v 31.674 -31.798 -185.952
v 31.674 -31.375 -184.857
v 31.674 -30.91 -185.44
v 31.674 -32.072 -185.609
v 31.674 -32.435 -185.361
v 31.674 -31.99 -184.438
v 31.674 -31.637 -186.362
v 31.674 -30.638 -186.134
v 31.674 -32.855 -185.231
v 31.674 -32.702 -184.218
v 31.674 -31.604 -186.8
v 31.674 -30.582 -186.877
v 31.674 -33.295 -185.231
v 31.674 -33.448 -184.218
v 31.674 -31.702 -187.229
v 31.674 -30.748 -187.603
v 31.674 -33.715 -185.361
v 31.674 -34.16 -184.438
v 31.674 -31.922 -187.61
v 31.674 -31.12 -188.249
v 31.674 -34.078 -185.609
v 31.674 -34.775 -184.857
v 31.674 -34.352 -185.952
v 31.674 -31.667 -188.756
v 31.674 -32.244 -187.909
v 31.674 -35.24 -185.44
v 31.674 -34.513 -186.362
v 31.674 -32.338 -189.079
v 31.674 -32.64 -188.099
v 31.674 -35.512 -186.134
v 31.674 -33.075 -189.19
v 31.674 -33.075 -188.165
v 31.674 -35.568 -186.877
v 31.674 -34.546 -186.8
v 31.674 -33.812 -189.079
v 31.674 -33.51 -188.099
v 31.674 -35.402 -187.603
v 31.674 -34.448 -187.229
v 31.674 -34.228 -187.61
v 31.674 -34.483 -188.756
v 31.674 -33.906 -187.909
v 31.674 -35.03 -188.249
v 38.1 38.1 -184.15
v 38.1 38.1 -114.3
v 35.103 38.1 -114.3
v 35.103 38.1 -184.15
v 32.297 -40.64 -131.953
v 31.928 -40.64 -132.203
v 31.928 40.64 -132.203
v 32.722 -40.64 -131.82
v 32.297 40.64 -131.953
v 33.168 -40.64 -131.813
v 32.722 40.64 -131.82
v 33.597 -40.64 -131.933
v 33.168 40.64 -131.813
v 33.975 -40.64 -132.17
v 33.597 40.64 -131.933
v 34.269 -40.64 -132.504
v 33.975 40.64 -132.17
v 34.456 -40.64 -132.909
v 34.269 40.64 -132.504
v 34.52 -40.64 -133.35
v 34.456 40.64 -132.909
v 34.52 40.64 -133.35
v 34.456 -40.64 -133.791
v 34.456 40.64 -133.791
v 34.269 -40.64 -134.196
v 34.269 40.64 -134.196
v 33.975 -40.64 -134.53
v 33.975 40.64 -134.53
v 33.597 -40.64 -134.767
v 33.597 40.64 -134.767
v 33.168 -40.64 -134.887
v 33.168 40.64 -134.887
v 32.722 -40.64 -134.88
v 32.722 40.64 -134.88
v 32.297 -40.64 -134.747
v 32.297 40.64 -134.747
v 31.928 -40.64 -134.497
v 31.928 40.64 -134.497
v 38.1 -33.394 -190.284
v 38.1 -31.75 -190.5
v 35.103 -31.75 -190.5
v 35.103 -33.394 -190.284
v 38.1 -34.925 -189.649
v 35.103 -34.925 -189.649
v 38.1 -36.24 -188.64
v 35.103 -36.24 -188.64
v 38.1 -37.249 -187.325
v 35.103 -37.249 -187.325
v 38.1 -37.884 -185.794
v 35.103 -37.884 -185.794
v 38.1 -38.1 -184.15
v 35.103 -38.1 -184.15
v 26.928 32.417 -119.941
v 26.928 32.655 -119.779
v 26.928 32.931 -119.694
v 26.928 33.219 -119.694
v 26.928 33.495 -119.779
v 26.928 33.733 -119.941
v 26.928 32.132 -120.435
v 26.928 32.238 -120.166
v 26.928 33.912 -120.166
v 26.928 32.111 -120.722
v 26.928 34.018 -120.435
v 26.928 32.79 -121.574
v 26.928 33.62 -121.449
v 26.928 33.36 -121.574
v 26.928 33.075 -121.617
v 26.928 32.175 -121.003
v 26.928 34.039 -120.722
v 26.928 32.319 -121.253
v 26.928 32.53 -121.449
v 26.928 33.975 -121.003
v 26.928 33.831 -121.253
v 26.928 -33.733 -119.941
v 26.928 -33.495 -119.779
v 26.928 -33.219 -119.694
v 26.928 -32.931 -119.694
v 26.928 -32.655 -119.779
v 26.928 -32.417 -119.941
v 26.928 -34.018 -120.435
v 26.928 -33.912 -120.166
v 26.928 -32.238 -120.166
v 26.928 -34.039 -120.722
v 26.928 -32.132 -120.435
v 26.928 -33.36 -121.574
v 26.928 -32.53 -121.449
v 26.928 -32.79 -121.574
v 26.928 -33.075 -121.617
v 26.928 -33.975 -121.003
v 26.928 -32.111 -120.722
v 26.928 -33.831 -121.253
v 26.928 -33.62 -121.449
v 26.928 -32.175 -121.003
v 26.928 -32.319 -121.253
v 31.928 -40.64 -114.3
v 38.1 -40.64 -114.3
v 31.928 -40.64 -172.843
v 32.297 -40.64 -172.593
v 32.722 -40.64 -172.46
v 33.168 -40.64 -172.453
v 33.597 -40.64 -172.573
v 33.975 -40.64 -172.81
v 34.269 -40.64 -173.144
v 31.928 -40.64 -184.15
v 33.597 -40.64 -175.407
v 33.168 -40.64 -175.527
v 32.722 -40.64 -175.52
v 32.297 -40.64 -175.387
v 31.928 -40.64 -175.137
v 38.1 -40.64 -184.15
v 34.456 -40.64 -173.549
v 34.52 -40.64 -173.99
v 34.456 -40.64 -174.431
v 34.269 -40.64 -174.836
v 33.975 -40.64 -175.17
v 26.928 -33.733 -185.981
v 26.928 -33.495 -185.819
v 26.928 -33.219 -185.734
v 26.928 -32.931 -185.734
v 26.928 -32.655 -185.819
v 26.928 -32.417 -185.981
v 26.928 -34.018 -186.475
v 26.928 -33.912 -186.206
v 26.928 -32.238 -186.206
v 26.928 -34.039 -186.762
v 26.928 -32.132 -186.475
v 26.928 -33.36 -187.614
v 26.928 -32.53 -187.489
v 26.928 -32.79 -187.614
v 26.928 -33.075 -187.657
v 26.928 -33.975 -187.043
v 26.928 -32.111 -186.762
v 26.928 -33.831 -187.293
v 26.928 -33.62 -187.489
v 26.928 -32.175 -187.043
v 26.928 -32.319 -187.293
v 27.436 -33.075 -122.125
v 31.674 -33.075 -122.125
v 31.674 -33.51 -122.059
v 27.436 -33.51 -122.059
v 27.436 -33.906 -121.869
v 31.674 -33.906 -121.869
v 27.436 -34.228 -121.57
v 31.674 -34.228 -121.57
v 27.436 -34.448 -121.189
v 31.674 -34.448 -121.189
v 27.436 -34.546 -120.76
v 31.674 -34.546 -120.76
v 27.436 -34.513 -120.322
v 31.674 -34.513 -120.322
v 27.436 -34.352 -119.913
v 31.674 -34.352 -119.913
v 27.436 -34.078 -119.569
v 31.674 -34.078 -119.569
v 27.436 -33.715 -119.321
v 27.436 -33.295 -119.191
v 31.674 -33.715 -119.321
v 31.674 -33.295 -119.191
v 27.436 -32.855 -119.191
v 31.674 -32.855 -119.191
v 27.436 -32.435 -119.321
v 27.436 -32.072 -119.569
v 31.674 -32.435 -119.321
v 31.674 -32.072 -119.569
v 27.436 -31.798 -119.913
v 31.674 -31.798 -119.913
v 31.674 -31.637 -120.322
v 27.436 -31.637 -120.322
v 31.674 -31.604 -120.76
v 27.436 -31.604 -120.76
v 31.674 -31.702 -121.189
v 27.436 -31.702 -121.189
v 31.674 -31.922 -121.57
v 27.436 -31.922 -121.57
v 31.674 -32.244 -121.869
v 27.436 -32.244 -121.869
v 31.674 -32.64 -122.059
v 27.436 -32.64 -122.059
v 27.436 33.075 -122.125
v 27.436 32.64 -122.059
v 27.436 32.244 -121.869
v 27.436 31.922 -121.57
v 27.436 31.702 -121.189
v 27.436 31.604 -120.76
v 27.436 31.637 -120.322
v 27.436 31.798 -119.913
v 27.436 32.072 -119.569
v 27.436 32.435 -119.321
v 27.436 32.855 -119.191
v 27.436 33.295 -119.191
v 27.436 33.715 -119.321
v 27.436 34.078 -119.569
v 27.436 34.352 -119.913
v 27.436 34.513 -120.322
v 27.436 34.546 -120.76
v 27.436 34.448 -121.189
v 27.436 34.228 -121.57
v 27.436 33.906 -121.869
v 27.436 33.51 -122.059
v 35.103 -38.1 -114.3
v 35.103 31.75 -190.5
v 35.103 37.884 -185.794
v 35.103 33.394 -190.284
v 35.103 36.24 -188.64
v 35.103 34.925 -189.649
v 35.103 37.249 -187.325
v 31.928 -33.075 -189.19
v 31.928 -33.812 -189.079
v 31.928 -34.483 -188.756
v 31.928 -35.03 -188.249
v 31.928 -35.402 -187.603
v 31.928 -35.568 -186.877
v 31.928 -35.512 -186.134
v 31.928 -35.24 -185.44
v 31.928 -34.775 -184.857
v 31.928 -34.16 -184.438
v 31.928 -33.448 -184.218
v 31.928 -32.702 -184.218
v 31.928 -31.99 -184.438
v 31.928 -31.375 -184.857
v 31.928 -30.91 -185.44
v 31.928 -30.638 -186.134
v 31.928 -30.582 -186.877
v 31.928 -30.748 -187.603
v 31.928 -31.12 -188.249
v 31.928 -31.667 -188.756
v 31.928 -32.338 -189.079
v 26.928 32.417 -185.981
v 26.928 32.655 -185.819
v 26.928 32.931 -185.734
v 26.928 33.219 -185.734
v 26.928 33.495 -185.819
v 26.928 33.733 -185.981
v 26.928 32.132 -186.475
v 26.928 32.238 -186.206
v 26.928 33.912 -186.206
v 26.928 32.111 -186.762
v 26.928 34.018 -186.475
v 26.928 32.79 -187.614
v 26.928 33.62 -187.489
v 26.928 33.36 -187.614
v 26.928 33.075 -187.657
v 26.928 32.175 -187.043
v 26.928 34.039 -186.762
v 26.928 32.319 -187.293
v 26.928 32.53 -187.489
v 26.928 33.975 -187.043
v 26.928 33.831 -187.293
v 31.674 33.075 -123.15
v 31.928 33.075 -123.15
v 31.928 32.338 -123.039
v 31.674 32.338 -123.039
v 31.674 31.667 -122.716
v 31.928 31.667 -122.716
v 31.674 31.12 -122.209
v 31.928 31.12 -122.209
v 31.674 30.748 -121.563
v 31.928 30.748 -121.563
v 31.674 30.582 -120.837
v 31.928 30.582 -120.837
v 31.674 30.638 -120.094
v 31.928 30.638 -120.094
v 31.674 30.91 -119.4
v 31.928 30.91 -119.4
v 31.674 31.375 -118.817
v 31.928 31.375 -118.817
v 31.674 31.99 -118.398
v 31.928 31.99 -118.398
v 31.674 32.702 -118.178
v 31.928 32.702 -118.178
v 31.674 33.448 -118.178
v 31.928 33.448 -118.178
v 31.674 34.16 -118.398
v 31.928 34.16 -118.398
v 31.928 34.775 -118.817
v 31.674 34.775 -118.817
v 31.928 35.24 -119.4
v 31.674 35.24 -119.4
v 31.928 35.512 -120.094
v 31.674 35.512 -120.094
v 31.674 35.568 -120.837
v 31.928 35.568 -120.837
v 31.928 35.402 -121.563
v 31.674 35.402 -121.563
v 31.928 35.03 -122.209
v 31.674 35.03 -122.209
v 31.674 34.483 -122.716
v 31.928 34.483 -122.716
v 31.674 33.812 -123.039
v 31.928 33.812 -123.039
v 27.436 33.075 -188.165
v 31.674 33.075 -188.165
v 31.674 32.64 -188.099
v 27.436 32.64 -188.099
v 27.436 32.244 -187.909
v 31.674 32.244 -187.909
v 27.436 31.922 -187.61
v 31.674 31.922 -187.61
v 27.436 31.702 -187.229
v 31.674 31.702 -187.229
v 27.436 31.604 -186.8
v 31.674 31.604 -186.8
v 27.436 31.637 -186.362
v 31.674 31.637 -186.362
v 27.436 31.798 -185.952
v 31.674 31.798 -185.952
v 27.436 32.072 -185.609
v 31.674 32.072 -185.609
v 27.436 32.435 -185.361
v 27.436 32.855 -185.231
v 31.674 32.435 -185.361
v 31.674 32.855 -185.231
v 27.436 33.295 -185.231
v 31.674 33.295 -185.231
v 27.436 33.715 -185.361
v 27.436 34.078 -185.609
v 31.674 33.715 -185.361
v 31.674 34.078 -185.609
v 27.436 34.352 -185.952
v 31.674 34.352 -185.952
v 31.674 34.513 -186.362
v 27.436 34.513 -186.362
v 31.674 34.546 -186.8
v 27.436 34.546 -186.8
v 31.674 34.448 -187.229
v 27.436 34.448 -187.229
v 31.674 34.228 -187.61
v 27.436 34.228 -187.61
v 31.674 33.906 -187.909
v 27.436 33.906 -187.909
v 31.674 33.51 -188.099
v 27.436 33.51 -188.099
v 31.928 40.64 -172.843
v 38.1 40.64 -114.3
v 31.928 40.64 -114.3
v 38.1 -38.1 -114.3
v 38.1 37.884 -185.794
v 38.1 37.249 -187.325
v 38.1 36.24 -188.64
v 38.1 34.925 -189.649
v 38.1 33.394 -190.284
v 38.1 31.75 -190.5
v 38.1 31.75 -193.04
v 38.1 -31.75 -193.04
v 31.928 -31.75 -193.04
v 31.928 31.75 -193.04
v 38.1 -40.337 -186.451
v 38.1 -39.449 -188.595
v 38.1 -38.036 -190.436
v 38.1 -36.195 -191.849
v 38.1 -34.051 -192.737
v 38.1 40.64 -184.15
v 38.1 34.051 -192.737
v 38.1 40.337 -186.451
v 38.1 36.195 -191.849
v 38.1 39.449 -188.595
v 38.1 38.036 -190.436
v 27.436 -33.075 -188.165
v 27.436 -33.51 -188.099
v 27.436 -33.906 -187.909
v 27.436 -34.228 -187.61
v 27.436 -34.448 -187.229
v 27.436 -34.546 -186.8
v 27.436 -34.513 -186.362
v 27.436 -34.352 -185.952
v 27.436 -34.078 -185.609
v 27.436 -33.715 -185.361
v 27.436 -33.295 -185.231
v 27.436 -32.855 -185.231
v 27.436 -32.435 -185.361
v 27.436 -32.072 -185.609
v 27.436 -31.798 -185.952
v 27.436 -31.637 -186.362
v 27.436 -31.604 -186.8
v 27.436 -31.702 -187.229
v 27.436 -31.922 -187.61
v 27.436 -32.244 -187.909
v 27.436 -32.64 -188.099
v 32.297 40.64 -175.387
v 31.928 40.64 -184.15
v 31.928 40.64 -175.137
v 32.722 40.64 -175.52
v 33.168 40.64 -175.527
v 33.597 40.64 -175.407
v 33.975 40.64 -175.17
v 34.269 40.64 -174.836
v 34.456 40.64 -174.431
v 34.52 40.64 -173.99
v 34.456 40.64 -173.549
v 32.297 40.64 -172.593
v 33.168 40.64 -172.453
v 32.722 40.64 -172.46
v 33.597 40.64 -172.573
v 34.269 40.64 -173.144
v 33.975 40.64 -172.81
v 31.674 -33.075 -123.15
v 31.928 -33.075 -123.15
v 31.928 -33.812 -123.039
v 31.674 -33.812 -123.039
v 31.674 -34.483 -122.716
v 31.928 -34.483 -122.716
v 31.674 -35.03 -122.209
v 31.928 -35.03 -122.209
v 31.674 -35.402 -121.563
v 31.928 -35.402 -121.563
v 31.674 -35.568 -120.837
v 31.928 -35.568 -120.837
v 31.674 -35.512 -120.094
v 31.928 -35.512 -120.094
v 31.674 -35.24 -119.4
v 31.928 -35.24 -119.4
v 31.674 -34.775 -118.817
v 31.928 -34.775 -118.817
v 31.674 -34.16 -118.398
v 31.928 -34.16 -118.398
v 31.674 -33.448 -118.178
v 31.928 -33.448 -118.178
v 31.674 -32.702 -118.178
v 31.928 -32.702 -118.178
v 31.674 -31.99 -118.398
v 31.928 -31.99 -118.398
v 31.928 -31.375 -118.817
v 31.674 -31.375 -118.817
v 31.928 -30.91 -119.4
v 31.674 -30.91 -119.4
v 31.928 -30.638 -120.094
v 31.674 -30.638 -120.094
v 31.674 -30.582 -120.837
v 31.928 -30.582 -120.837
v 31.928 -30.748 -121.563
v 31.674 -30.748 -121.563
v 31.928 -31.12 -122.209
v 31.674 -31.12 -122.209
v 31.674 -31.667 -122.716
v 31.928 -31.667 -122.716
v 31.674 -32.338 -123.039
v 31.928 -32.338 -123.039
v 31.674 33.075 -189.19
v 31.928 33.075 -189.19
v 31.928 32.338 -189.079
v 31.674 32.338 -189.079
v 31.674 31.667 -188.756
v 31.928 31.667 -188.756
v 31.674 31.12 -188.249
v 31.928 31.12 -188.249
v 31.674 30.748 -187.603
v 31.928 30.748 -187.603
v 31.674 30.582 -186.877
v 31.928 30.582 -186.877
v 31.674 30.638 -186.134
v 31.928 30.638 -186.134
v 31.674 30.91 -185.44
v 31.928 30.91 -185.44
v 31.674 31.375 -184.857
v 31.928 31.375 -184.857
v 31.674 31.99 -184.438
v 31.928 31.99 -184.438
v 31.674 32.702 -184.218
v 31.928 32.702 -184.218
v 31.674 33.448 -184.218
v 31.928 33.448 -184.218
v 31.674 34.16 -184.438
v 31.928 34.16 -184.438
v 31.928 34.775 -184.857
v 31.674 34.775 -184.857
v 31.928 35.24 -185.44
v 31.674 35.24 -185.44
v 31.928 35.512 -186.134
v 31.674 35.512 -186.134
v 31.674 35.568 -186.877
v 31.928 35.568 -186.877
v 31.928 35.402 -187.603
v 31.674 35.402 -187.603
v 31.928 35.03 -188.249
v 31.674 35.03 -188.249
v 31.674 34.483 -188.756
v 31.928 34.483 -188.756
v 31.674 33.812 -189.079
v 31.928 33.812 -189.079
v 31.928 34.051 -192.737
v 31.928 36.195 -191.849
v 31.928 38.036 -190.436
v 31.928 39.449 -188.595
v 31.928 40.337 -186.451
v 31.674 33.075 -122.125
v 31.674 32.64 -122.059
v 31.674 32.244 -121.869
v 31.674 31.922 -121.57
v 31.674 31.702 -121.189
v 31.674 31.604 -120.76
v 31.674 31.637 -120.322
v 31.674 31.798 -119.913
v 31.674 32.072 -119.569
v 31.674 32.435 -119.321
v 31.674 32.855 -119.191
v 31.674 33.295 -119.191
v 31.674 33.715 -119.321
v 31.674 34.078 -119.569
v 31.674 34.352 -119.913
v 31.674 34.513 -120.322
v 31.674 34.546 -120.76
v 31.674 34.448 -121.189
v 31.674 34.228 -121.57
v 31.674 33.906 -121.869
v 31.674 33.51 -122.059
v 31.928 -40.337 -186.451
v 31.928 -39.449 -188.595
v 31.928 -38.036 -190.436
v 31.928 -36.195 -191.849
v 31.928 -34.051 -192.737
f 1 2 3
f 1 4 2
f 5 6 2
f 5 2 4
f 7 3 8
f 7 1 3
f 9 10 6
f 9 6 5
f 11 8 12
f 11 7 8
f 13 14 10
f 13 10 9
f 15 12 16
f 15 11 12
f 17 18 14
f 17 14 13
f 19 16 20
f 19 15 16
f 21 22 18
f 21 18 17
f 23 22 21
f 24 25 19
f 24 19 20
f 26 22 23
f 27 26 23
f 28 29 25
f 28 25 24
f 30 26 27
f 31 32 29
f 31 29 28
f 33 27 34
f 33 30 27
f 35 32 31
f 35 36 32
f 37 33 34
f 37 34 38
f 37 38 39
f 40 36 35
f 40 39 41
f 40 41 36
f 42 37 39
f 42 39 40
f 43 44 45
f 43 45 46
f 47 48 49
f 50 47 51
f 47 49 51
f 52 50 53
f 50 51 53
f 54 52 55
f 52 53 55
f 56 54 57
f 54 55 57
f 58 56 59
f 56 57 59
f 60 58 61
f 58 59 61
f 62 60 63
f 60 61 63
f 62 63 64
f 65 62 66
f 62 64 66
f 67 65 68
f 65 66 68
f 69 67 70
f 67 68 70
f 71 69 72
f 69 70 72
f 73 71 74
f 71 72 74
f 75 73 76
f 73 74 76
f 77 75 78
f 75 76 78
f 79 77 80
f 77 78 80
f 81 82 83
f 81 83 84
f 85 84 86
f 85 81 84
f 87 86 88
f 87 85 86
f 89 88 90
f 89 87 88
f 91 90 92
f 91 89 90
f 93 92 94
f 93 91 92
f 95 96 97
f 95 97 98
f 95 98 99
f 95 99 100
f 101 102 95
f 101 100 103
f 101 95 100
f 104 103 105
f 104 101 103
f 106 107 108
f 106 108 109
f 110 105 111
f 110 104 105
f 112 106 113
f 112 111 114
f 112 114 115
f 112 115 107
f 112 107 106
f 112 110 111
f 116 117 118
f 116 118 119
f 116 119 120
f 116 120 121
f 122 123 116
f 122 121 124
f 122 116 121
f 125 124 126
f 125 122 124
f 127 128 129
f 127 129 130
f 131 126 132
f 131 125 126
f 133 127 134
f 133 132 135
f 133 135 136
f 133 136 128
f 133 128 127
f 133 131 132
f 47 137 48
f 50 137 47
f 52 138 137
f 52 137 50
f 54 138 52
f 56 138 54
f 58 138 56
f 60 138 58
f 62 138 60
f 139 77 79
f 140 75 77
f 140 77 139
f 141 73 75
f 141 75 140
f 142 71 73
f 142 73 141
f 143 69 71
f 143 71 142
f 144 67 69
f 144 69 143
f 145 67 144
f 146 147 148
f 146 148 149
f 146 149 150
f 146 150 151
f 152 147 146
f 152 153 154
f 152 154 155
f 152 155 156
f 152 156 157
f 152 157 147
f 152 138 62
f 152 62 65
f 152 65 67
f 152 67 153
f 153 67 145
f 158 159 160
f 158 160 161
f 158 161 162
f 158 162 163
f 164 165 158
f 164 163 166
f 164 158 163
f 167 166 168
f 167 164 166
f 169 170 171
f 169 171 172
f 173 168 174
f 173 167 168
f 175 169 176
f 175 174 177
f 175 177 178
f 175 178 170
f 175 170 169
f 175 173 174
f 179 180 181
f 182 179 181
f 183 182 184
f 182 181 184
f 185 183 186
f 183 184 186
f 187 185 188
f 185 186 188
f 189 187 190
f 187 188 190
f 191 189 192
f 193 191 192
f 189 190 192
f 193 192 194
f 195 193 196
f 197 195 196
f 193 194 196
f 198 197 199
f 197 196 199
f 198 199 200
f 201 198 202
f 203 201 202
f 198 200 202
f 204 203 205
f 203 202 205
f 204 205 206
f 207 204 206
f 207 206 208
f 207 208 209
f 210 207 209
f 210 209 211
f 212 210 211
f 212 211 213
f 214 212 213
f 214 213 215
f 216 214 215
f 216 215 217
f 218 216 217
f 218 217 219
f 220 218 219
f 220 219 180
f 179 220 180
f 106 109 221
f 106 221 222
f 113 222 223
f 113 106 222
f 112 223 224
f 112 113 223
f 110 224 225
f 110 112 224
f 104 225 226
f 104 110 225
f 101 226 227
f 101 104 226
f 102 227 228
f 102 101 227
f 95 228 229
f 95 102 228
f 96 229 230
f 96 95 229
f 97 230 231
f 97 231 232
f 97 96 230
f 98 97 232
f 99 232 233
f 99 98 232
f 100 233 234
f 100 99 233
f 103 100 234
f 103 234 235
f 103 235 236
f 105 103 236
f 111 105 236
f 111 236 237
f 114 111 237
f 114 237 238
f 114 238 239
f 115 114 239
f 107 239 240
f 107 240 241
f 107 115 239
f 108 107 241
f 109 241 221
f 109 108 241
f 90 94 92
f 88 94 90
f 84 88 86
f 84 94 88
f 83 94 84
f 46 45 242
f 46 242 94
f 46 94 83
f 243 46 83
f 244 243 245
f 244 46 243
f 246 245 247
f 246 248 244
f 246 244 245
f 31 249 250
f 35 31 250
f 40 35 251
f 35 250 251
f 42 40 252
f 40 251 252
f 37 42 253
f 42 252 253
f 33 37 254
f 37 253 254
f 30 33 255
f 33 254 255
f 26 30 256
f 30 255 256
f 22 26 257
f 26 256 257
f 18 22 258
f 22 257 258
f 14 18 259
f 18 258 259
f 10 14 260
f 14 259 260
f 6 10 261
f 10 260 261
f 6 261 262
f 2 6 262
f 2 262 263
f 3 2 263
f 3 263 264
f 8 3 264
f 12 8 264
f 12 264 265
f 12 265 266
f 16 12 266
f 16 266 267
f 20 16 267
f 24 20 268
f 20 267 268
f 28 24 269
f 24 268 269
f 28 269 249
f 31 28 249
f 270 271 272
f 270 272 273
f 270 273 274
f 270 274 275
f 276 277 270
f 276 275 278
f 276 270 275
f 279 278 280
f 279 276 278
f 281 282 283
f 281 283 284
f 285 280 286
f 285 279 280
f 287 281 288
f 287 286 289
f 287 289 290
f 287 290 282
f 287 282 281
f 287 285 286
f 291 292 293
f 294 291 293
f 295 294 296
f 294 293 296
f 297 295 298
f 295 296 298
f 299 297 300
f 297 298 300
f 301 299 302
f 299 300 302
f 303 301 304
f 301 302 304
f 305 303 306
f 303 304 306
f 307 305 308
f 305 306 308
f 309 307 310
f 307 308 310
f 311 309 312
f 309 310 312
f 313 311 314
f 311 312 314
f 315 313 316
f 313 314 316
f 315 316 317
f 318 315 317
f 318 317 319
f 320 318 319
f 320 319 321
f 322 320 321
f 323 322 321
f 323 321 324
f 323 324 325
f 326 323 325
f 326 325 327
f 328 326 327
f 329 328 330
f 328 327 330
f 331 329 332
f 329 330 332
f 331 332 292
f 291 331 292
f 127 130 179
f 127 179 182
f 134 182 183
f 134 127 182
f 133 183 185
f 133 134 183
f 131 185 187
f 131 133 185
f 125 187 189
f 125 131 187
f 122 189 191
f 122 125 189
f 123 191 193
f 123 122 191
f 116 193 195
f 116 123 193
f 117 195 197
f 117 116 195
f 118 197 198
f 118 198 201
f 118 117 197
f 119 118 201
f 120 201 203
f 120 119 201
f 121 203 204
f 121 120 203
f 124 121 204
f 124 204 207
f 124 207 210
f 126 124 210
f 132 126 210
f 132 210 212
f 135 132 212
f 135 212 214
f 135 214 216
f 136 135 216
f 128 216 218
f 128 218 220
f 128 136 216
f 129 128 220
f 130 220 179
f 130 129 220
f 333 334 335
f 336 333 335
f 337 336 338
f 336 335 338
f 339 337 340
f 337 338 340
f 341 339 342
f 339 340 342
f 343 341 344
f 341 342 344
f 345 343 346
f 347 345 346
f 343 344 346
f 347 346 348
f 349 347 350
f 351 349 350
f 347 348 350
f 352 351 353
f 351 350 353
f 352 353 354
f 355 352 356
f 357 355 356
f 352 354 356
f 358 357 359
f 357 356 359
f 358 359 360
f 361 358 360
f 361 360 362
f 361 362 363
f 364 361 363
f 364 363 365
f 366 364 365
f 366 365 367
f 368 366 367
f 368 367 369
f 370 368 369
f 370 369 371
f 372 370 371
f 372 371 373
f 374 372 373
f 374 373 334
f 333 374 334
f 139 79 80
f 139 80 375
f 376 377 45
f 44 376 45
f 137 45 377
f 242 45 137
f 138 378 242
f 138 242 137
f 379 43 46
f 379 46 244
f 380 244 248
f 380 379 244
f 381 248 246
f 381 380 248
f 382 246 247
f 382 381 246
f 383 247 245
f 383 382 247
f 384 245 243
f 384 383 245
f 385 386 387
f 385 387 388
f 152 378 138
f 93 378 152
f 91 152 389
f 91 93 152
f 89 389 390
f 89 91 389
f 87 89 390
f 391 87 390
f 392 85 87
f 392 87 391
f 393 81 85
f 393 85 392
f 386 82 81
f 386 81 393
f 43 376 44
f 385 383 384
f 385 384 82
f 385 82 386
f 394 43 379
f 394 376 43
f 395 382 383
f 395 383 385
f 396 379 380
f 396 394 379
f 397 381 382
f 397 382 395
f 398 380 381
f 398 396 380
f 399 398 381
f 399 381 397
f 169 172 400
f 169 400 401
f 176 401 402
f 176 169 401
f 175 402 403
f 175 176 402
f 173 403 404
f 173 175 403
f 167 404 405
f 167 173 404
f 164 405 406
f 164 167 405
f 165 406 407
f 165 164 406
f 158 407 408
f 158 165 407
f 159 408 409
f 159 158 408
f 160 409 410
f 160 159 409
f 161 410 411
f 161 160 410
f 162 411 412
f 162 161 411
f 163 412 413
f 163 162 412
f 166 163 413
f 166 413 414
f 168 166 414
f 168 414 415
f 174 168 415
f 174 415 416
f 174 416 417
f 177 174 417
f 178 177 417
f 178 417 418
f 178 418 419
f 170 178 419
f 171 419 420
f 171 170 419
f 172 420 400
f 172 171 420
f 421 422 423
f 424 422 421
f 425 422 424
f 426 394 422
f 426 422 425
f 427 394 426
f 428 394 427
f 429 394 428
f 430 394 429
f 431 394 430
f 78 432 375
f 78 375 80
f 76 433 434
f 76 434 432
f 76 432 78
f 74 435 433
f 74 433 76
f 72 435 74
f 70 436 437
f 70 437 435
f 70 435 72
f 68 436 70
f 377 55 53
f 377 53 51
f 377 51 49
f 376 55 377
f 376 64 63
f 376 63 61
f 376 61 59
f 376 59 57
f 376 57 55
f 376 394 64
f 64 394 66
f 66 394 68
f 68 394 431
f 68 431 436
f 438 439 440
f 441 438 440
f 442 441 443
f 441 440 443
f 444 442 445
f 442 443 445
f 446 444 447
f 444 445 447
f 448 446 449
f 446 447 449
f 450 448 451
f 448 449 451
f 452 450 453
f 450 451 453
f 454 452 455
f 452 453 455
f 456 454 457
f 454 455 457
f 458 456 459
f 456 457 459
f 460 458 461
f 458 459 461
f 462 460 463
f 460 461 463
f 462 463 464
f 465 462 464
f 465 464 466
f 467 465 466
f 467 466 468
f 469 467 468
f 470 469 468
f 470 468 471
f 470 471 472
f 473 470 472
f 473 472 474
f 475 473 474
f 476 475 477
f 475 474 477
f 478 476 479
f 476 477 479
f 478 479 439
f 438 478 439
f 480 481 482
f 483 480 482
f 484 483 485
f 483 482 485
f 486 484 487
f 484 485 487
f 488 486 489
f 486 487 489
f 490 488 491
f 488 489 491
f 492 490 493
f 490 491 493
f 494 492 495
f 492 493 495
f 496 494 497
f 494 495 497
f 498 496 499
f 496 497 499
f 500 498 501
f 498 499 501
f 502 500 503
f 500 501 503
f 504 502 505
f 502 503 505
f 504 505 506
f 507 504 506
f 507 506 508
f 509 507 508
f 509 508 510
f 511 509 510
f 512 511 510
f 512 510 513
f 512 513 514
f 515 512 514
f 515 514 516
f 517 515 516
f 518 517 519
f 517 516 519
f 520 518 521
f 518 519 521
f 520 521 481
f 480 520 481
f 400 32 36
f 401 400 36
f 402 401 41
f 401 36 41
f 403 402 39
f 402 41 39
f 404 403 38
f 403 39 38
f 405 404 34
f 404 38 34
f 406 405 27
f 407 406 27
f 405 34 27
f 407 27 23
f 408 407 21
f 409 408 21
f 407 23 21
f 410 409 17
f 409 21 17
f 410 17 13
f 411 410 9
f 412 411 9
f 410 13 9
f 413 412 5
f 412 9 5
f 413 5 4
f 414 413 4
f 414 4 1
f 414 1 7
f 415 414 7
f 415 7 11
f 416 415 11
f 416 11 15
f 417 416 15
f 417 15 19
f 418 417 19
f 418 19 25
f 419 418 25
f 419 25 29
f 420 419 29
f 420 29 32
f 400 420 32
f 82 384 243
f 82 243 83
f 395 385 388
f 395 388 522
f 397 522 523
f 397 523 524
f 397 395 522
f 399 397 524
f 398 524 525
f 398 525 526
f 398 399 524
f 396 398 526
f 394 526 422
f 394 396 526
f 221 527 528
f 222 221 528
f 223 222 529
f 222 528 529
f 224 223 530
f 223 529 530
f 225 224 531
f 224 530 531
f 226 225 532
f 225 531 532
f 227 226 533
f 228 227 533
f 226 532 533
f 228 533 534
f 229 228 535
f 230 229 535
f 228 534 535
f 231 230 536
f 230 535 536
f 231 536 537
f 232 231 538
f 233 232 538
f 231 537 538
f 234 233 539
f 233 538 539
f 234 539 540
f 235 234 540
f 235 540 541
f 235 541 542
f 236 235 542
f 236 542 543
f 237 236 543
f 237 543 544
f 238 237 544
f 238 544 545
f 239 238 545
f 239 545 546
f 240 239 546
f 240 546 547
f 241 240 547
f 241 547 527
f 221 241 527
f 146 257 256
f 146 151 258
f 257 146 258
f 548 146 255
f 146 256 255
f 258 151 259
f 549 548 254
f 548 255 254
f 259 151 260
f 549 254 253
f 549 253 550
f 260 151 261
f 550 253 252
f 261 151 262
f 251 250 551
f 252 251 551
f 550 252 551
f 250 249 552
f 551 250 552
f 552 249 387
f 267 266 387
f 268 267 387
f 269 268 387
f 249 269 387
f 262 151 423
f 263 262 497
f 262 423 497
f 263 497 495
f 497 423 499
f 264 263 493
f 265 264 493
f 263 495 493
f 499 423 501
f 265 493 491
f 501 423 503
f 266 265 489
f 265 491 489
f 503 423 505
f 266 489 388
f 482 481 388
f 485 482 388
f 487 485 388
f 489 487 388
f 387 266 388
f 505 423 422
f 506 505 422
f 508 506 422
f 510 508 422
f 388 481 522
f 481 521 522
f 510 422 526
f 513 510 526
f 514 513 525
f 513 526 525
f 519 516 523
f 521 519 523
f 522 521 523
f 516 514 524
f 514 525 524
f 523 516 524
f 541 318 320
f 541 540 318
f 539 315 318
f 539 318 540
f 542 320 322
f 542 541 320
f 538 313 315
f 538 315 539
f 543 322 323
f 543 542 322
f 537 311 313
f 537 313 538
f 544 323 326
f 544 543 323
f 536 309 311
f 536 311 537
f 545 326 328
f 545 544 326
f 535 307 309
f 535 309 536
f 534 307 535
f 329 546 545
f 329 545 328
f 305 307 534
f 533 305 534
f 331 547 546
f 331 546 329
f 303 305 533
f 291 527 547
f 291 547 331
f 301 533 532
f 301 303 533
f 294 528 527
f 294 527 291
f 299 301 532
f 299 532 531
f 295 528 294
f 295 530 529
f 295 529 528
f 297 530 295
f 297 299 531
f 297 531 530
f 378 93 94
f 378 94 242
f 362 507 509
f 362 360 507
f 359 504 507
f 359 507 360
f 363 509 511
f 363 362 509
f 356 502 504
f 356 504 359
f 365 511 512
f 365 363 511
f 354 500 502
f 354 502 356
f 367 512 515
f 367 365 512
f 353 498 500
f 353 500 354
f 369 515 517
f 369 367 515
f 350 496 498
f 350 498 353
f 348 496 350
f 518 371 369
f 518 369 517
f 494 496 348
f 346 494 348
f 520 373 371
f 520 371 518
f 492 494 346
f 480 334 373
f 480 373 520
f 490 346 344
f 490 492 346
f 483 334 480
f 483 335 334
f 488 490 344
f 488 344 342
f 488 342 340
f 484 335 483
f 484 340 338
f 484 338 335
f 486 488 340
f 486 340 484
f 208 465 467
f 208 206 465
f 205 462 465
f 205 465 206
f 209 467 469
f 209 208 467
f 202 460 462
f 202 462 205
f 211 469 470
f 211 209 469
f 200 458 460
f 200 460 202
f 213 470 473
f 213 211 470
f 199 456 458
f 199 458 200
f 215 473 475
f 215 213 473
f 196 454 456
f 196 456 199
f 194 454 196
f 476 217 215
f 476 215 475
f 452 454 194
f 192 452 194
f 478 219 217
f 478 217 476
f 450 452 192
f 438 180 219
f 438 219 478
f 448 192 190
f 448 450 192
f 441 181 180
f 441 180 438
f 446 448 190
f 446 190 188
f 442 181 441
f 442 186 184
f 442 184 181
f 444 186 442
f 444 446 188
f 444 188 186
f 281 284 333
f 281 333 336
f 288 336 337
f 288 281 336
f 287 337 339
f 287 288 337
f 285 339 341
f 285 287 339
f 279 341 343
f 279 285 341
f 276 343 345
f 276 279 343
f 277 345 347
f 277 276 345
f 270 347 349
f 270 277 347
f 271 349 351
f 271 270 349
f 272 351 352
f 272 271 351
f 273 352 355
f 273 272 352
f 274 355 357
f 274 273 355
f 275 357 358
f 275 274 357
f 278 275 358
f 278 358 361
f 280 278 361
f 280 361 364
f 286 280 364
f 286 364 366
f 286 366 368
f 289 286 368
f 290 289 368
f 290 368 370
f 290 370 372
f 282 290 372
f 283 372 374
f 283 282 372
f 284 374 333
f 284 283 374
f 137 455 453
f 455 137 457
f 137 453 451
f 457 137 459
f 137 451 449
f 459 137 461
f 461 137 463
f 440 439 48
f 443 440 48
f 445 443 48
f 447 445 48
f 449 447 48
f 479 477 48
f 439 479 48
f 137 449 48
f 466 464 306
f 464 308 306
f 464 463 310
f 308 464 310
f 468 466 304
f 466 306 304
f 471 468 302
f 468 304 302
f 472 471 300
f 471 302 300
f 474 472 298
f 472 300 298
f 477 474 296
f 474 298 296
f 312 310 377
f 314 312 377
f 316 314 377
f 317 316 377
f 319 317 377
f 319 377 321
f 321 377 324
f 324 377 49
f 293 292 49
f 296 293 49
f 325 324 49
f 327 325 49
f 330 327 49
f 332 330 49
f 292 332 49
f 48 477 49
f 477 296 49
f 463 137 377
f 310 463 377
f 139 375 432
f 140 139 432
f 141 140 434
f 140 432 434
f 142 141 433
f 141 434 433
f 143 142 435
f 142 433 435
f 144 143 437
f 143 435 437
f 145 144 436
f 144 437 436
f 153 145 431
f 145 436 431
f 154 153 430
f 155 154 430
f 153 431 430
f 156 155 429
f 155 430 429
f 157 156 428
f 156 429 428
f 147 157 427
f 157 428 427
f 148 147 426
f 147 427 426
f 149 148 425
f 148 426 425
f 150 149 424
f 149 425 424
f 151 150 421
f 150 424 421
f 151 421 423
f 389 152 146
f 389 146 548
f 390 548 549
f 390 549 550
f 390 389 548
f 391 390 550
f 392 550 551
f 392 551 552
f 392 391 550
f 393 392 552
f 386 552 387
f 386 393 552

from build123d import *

# Parameters (mm, degrees)
BOSS_EXTRUDE1_DEPTH = 3.175
EXTRUDE_THIN1_START = -6.1722
EXTRUDE_THIN1_DEPTH = 6.1722
SKETCH5_R           = 1.475
BOSS_EXTRUDE2_DEPTH = 5
SKETCH6_R           = 1.55
CUT_EXTRUDE1_DEPTH  = 213.890793601
CHAMFER1_SIZE       = 0.508
SKETCH7_R           = 2.5
BOSS_EXTRUDE3_DEPTH = 0.254


with BuildPart() as part:
    # Sketch1 → Boss-Extrude1 (new body)
    with BuildSketch(Plane.ZY.offset(-35.1028)):
        with BuildLine():
            Line((-114.3, 38.1), (-114.3, -38.1))
            Line((-114.3, -38.1), (-184.15, -38.1))
            ThreePointArc((-184.15, -38.1), (-188.640128061, -36.240128061), (-190.5, -31.75))
            Line((-190.5, -31.75), (-190.5, 31.75))
            ThreePointArc((-190.5, 31.75), (-188.640128061, 36.240128061), (-184.15, 38.1))
            Line((-184.15, 38.1), (-114.3, 38.1))
        make_face()
    extrude(amount=BOSS_EXTRUDE1_DEPTH)

    # Sketch4 → Extrude-Thin1 (add)
    with BuildSketch(Plane.ZY.offset(-31.9278).offset(EXTRUDE_THIN1_START)):
        with BuildLine():
            Line((-114.3, 38.1), (-184.15, 38.1))
            ThreePointArc((-184.15, 38.1), (-188.640128061, 36.240128061), (-190.5, 31.75))
            Line((-190.5, 31.75), (-190.5, -31.75))
            ThreePointArc((-190.5, -31.75), (-188.640128061, -36.240128061), (-184.15, -38.1))
            Line((-184.15, -38.1), (-114.3, -38.1))
            Line((-114.3, -38.1), (-114.3, -40.64))
            Line((-114.3, -40.64), (-184.15, -40.64))
            ThreePointArc((-184.15, -40.64), (-190.436179285, -38.036179285), (-193.04, -31.75))
            Line((-193.04, -31.75), (-193.04, 31.75))
            ThreePointArc((-193.04, 31.75), (-190.436179285, 38.036179285), (-184.15, 40.64))
            Line((-184.15, 40.64), (-114.3, 40.64))
            Line((-114.3, 40.64), (-114.3, 38.1))
        make_face()
    extrude(amount=EXTRUDE_THIN1_DEPTH)

    # Sketch5 → Boss-Extrude2 (add)
    with BuildSketch(Plane.ZY.offset(-31.9278)):
        with Locations(Location((-186.69, 33.075, 0), (0, 0, 180))):
            Circle(SKETCH5_R)
        with Locations(Location((-120.65, 33.075, 0), (0, 0, 180))):
            Circle(SKETCH5_R)
        with Locations(Location((-120.65, -33.075, 0), (0, 0, 180))):
            Circle(SKETCH5_R)
        with Locations(Location((-186.69, -33.075, 0), (0, 0, 180))):
            Circle(SKETCH5_R)
    extrude(amount=BOSS_EXTRUDE2_DEPTH)

    # Sketch6 → Cut-Extrude1 (cut, through all)
    with BuildSketch(Plane(origin=(0, 40.64, 0), x_dir=(1, 0, 0), z_dir=(0, 1, 0))):
        with Locations((32.9698, 173.99)):
            Circle(SKETCH6_R)
        with Locations((32.9698, 133.35)):
            Circle(SKETCH6_R)
    extrude(amount=-CUT_EXTRUDE1_DEPTH, mode=Mode.SUBTRACT)

    # Chamfer1
    chamfer1_edges = [part.edges().sort_by_distance(p)[0] for p in [
        (26.9278, -33.075, -185.215),
        (26.9278, -33.075, -119.175),
        (26.9278, 33.075, -119.175),
        (26.9278, 33.075, -185.215),
    ]]
    chamfer(chamfer1_edges, length=CHAMFER1_SIZE)

    # Sketch7 → Boss-Extrude3 (add)
    with BuildSketch(Plane.ZY.offset(-31.9278)):
        with Locations(Location((-186.69, 33.075, 0), (0, 0, 180))):
            Circle(SKETCH7_R)
        with Locations(Location((-120.65, 33.075, 0), (0, 0, 180))):
            Circle(SKETCH7_R)
        with Locations(Location((-120.65, -33.075, 0), (0, 0, 180))):
            Circle(SKETCH7_R)
        with Locations(Location((-186.69, -33.075, 0), (0, 0, 180))):
            Circle(SKETCH7_R)
    extrude(amount=BOSS_EXTRUDE3_DEPTH)


solid = part.part
